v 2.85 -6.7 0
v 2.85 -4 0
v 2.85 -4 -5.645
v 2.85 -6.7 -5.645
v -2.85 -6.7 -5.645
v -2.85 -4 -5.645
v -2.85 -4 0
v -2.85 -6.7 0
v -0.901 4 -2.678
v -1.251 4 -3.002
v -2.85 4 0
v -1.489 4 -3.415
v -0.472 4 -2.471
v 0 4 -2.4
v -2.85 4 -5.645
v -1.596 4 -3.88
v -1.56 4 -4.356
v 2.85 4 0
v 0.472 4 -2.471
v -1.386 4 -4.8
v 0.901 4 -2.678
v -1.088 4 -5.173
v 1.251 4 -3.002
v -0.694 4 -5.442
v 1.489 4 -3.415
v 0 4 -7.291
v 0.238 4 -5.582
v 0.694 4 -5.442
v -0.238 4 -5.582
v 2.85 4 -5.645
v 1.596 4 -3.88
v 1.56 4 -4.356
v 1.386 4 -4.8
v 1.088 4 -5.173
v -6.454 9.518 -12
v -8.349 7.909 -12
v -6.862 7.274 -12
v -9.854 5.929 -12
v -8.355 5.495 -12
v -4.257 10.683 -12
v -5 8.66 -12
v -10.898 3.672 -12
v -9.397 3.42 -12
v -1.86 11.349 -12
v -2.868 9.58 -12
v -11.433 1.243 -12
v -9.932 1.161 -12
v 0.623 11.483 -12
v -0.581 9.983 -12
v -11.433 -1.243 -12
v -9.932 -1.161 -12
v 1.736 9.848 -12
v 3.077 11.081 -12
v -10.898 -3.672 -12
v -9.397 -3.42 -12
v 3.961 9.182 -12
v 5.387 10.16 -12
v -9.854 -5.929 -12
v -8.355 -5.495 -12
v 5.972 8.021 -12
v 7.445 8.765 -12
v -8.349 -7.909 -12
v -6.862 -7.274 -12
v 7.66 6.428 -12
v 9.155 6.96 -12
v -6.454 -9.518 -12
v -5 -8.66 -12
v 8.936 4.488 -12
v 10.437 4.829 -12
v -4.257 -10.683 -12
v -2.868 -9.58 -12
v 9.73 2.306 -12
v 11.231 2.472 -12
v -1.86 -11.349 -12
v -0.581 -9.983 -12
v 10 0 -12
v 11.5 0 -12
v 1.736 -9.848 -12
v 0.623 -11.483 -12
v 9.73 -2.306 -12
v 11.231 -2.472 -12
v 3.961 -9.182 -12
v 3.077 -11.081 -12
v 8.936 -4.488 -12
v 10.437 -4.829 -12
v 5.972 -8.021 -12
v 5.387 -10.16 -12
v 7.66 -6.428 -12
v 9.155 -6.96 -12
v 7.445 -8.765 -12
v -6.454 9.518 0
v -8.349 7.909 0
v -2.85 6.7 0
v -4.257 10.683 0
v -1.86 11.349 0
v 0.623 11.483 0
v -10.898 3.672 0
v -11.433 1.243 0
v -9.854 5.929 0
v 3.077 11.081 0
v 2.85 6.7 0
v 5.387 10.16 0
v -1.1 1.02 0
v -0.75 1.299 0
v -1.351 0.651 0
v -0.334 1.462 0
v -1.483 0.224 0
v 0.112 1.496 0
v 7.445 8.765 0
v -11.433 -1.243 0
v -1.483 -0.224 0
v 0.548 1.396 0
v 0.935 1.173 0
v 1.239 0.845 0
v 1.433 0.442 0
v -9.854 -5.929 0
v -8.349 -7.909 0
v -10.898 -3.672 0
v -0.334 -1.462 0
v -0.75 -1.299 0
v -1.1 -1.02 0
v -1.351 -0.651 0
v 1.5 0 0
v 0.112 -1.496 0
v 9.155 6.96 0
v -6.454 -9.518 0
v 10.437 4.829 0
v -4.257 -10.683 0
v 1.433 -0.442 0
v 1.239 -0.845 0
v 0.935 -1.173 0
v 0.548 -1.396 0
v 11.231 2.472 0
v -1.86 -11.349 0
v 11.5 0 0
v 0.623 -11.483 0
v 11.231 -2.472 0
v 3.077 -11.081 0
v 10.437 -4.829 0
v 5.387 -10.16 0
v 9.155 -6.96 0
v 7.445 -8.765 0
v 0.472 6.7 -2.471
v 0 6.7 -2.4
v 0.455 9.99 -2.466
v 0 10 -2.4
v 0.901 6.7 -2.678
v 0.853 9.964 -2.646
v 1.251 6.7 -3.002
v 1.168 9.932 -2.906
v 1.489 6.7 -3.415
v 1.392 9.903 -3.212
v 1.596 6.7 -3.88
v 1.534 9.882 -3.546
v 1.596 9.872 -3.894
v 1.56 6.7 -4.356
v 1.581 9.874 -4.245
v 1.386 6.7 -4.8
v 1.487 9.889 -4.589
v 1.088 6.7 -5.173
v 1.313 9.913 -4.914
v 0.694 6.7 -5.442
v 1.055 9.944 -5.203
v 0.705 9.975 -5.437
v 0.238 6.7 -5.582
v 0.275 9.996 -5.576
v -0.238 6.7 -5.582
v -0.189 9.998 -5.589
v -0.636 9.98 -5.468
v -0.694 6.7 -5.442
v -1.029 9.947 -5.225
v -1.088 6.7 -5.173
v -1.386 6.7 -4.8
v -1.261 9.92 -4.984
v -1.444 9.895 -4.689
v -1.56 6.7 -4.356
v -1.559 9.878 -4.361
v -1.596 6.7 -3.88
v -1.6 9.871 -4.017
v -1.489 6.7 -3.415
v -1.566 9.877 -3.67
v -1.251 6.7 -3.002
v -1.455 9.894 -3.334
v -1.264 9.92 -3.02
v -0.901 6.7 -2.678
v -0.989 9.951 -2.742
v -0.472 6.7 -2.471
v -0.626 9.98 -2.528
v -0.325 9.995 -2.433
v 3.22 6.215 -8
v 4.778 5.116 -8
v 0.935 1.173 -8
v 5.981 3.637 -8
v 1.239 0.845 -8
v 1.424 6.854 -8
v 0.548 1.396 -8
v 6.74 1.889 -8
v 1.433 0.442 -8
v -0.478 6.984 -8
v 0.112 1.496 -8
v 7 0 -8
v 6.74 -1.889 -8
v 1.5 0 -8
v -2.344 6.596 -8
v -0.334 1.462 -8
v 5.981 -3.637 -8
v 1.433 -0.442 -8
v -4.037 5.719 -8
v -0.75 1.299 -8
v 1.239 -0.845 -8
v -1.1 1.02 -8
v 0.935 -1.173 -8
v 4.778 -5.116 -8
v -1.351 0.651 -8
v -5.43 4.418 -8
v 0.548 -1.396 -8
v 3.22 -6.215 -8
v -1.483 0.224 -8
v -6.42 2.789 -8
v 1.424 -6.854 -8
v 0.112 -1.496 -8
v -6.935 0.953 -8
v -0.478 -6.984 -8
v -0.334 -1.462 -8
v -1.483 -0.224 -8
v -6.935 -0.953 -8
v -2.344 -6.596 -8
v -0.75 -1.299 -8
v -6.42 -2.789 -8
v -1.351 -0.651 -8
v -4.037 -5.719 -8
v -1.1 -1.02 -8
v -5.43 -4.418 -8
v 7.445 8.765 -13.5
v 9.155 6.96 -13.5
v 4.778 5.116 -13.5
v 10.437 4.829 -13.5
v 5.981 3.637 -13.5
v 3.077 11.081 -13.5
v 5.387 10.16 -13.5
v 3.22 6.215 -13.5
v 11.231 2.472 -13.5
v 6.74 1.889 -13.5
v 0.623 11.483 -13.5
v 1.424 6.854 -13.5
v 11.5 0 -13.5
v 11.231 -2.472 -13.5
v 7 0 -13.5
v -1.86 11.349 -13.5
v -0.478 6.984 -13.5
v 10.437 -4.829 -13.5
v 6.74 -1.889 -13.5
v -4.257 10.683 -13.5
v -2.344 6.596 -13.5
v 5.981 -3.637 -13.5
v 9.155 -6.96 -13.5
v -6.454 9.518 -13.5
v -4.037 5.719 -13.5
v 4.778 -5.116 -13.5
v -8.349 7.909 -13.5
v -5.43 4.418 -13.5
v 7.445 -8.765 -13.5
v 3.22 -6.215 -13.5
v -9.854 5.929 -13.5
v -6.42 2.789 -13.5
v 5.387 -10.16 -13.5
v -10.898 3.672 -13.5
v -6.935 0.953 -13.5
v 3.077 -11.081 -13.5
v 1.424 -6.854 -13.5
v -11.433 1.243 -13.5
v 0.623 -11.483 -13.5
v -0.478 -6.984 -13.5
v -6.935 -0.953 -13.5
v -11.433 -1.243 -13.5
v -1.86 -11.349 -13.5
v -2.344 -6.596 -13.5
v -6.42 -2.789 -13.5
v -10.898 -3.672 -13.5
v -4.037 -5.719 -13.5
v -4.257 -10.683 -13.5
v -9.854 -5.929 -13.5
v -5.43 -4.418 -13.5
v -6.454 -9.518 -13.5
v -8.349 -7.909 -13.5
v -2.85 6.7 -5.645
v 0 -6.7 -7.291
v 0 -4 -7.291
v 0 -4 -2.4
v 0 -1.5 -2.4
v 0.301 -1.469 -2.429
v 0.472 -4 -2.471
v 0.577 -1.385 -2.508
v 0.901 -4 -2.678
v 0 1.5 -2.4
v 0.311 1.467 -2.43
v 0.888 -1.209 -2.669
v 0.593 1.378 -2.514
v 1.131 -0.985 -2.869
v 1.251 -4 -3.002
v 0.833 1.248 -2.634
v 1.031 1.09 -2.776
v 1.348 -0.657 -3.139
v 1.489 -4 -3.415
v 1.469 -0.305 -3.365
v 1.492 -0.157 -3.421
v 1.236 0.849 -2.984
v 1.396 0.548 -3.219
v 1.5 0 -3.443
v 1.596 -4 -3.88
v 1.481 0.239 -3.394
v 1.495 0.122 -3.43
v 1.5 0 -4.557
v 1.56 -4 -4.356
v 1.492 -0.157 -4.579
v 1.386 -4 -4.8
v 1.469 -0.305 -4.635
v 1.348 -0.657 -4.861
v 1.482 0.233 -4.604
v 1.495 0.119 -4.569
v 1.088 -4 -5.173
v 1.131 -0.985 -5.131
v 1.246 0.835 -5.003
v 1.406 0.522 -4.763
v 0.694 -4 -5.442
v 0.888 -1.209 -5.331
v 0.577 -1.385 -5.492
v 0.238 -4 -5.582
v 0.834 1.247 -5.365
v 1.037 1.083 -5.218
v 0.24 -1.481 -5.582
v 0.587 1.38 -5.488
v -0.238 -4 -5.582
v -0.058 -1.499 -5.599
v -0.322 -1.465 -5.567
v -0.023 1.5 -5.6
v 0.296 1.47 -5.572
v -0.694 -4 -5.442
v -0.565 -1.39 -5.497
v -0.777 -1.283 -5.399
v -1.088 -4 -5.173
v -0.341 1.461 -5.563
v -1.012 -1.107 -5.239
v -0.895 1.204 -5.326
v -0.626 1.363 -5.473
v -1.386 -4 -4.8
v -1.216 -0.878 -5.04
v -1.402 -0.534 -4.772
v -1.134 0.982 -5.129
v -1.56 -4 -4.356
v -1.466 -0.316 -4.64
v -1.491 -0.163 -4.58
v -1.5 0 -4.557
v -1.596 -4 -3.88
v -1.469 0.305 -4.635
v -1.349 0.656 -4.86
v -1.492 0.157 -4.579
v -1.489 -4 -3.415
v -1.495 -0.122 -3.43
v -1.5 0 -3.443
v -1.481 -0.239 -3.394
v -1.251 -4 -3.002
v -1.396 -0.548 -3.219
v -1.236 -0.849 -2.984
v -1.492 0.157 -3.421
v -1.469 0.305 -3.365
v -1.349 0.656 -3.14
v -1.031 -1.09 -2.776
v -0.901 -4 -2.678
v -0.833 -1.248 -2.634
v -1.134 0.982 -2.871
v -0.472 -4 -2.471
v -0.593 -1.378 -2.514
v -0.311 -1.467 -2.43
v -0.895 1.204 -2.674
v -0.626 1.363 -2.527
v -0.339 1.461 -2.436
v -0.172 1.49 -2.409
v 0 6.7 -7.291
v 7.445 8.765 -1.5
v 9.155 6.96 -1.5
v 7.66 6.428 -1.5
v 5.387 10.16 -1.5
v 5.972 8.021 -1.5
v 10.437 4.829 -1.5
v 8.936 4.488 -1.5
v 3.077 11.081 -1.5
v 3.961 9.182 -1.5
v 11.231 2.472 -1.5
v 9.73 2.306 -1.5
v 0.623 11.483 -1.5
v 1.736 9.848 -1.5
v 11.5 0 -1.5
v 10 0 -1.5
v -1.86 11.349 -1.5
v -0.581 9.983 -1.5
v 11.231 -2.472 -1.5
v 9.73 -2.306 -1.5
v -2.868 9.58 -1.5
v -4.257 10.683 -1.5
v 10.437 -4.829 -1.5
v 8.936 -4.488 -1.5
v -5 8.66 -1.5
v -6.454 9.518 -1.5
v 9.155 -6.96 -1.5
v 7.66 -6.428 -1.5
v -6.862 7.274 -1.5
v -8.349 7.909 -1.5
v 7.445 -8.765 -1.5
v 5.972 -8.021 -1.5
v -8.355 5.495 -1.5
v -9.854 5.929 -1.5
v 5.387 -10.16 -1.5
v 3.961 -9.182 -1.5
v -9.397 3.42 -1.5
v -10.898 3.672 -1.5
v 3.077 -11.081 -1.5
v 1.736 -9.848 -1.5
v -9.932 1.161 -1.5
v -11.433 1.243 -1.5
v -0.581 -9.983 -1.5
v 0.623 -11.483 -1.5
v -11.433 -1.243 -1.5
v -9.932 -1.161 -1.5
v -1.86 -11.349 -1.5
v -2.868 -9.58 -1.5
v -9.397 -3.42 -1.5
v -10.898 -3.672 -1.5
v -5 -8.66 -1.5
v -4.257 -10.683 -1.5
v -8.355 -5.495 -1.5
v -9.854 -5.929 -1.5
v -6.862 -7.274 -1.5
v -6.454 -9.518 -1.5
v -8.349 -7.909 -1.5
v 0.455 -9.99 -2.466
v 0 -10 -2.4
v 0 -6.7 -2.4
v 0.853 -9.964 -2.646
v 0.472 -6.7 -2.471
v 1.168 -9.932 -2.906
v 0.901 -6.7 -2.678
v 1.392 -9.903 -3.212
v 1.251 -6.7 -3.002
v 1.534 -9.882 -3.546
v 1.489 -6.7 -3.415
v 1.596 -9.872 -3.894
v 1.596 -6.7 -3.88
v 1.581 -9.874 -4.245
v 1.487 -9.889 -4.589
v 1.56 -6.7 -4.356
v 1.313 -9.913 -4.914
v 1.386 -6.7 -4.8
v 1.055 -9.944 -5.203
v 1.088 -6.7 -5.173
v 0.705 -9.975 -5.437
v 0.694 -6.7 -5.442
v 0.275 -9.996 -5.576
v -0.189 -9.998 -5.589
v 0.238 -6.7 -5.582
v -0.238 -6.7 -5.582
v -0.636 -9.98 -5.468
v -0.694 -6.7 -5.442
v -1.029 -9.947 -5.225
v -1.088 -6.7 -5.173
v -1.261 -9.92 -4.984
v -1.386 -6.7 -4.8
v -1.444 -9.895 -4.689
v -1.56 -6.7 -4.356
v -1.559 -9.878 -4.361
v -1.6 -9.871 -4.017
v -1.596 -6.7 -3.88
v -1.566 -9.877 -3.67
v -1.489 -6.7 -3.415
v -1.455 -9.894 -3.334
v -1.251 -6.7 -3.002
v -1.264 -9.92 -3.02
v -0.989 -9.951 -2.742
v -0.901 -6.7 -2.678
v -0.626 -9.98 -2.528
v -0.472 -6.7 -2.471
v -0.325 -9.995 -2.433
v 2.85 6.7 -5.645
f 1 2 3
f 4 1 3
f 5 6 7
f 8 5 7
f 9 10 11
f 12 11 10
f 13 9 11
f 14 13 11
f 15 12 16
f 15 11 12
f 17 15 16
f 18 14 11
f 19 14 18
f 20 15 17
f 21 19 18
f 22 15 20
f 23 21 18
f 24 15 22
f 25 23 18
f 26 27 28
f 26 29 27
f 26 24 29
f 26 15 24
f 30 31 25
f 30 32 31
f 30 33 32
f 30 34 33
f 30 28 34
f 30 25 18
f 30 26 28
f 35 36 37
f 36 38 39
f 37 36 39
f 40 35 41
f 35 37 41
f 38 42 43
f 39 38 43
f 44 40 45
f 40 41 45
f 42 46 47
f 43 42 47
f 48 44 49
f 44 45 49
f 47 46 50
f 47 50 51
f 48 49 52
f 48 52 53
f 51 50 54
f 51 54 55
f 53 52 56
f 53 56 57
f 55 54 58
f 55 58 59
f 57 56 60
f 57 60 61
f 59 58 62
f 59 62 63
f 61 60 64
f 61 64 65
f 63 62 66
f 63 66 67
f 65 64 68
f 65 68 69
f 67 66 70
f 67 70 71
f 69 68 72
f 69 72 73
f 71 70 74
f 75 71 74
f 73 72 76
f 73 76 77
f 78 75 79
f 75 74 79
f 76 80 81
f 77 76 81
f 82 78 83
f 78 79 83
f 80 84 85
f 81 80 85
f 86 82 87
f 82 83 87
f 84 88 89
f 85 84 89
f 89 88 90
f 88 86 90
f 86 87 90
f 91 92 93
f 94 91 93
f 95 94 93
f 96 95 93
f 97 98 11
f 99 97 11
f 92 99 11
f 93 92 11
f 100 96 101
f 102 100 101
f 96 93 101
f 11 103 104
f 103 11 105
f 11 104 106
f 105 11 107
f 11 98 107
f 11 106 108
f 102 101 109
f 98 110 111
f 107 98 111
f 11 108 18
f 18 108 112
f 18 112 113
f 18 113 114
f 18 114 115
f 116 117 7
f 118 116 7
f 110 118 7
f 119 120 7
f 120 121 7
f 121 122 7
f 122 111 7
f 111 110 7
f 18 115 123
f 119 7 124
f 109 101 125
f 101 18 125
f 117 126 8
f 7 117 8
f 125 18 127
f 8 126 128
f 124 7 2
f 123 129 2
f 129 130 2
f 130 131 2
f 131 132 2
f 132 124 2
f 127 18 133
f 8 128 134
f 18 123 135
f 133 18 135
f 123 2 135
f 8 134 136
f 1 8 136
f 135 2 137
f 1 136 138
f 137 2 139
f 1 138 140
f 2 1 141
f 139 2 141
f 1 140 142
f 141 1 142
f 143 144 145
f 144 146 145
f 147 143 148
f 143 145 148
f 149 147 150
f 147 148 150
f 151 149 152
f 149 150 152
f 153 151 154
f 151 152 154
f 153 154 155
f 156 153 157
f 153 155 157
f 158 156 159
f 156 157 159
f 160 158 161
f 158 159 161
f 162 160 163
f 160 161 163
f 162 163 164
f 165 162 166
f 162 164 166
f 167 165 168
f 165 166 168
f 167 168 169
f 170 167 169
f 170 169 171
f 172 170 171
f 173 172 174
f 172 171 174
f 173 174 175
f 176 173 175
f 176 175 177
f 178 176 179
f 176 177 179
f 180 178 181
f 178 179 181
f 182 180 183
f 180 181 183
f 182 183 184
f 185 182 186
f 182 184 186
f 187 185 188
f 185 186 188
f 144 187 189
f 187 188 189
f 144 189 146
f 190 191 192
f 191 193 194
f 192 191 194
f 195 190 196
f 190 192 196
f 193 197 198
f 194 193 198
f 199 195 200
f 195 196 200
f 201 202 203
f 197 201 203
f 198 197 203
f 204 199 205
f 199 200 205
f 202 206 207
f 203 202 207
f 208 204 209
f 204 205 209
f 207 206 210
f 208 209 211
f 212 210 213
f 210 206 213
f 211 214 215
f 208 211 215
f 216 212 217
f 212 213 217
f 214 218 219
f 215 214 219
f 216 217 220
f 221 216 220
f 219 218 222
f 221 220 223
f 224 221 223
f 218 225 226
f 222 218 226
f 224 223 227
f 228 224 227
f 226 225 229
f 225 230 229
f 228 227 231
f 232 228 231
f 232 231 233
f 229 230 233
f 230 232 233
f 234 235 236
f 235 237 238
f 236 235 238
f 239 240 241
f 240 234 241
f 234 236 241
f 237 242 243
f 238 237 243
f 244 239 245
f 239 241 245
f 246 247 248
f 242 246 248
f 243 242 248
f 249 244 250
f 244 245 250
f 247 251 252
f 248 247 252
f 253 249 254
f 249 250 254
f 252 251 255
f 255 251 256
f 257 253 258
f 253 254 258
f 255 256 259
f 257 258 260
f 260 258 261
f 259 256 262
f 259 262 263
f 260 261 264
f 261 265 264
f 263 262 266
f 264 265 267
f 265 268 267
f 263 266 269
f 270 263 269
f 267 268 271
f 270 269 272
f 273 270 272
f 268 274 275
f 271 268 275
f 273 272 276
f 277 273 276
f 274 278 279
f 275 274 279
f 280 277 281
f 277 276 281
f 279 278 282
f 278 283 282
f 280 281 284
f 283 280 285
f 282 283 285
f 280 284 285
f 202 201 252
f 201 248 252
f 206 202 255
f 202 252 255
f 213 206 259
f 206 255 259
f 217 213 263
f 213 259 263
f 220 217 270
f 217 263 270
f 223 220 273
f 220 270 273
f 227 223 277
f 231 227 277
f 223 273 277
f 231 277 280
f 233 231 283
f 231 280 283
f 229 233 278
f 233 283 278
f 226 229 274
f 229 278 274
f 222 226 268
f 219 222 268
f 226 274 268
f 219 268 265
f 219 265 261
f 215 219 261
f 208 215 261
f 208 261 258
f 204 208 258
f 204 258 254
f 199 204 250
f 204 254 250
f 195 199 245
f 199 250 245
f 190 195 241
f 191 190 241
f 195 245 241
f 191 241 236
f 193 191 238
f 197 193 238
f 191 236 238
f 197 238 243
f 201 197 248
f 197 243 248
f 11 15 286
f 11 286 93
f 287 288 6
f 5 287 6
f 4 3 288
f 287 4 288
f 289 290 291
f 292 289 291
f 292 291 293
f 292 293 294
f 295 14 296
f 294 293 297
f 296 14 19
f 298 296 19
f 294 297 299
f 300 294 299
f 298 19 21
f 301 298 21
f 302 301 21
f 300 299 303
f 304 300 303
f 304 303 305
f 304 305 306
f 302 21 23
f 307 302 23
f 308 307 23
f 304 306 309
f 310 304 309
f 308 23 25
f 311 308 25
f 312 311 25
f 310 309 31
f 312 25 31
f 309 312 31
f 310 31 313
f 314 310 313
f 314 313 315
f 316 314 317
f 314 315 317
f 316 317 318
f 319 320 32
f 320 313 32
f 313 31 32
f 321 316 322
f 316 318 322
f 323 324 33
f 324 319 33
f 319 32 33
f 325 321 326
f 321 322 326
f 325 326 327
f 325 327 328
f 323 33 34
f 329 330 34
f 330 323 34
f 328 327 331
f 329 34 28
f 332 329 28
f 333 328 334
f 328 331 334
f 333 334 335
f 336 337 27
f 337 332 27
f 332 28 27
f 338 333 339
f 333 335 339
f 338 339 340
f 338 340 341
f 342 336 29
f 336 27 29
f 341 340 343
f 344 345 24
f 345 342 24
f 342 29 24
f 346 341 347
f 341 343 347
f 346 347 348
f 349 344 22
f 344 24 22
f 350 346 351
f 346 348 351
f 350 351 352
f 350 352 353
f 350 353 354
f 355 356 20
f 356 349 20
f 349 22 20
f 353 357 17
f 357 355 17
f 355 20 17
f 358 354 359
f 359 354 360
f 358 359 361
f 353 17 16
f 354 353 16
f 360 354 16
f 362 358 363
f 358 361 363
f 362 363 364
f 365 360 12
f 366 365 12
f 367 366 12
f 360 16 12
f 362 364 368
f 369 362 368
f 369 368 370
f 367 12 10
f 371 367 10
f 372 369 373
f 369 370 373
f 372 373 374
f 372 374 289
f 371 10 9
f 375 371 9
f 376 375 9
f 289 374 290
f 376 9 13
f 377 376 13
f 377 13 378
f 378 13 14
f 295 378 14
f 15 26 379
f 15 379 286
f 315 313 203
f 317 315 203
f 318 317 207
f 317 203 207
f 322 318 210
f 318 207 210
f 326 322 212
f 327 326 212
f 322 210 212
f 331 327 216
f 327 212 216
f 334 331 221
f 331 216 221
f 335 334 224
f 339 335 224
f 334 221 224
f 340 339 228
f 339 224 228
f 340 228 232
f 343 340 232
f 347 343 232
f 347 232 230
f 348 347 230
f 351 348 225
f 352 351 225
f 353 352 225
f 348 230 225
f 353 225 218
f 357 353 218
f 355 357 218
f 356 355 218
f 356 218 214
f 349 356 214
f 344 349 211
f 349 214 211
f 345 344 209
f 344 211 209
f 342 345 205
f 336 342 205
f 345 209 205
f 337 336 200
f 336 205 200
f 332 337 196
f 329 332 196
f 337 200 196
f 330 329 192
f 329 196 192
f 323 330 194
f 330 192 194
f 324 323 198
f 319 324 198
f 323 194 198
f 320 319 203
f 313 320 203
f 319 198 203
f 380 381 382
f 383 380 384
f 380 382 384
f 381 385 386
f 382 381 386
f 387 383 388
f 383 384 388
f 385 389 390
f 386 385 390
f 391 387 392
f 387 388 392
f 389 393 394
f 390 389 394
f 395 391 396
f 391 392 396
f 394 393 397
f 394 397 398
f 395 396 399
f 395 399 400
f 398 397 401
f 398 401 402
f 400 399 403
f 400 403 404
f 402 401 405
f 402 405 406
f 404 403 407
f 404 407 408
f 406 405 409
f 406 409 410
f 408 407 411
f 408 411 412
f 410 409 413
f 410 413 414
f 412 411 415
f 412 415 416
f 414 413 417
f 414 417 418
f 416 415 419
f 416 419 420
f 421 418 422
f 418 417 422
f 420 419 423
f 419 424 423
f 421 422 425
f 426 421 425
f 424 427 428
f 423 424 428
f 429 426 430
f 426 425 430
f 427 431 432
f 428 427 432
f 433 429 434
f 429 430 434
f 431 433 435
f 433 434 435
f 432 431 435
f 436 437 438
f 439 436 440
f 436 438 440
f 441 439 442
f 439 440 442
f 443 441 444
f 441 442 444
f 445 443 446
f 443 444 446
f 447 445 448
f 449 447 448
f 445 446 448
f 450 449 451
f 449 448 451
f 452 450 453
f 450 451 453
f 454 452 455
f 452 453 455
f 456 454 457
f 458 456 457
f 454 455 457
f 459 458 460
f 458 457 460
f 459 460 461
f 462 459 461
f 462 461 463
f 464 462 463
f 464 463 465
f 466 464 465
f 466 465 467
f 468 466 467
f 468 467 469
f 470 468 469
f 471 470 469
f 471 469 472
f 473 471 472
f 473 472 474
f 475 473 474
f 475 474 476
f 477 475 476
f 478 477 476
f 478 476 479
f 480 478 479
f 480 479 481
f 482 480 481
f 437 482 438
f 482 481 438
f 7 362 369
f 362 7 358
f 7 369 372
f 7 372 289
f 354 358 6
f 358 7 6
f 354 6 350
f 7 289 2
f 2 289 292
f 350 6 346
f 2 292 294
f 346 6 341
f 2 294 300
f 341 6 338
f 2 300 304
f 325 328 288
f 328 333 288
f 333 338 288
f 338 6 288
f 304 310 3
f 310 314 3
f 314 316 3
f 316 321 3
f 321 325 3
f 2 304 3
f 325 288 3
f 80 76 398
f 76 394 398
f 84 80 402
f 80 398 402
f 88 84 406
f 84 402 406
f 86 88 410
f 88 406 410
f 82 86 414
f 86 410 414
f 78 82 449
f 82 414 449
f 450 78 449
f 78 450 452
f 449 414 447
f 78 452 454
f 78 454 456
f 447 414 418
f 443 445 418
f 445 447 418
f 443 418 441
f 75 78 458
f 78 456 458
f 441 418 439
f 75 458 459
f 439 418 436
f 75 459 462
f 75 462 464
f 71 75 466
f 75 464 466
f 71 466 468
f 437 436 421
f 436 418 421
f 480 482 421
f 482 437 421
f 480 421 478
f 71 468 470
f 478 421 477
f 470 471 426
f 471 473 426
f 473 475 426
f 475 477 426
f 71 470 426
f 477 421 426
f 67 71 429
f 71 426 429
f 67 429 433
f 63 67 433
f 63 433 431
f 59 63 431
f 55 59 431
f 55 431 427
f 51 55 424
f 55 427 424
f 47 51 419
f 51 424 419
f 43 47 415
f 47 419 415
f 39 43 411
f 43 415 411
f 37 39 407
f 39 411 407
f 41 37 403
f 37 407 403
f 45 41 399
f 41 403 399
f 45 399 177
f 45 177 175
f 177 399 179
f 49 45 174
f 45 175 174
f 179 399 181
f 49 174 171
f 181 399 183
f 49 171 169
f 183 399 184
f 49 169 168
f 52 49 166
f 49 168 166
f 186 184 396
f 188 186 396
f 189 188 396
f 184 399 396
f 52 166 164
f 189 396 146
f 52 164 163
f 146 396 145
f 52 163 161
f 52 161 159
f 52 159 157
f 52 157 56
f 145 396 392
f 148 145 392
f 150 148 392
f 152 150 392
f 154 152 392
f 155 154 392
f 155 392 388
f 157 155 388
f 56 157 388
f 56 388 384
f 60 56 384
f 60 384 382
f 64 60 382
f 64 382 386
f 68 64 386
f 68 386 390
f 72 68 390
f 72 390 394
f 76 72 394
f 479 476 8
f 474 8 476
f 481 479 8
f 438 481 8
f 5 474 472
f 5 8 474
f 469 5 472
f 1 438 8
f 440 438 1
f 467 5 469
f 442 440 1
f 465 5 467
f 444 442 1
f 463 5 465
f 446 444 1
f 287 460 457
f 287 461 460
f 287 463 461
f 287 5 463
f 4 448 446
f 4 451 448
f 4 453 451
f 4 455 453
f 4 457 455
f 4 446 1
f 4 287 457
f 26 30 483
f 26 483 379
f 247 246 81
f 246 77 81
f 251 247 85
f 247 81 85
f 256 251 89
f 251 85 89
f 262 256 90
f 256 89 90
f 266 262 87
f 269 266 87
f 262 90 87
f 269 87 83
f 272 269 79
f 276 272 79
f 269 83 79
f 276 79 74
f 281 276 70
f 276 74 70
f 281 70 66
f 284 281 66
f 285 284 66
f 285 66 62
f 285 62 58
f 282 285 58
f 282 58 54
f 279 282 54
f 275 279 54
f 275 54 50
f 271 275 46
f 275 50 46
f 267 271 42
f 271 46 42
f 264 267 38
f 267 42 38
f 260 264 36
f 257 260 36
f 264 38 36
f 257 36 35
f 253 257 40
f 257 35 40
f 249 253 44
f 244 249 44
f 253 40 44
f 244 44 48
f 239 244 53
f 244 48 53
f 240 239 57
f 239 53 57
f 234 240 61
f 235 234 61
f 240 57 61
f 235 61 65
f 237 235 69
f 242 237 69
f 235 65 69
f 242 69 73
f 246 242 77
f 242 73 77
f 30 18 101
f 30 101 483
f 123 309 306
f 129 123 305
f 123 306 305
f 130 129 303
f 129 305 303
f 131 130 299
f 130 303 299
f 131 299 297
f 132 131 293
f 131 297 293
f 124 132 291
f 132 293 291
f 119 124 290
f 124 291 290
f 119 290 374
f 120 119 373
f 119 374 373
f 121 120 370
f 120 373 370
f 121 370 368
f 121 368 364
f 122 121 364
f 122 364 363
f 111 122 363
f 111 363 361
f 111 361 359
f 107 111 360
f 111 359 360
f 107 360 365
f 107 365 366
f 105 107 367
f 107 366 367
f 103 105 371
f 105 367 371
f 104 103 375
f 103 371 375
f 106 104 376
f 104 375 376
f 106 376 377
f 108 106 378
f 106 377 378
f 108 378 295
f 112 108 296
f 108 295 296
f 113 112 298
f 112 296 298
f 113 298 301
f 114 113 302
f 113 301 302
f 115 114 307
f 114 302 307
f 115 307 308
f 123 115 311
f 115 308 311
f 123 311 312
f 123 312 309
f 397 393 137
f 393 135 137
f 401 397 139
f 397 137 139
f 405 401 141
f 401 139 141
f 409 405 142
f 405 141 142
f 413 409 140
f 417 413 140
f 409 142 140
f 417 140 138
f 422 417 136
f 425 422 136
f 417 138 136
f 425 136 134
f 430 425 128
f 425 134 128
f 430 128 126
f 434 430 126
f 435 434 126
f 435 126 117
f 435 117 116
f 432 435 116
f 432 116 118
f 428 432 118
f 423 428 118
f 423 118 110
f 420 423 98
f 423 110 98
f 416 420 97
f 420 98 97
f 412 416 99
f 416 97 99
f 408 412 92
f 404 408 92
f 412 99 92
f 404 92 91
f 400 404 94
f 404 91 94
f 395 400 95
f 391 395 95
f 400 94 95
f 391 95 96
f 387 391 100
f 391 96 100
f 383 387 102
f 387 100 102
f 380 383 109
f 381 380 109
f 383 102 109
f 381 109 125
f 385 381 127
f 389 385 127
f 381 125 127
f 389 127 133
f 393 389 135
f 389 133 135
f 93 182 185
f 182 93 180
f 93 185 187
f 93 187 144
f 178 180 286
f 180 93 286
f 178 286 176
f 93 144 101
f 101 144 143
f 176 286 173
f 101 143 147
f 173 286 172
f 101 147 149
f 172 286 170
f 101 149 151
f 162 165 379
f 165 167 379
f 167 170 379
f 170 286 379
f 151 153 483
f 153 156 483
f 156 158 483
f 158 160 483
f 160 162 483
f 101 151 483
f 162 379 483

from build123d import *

# Parameters (mm, degrees)
SKETCH_2_R          = 1.6
CUT_EXTRUDE_1_DEPTH = 22.136461388
CUT_EXTRUDE_START   = -4
SKETCH_2_4_R        = 1.6
CUT_EXTRUDE_2_DEPTH = 2.7


with BuildPart() as part:
    # Эскиз1 → Повернуть1 (revolve)
    with BuildSketch(Plane(origin=(0, 0, 0), x_dir=(0, 0, -1), z_dir=(1, 0, 0))):
        Polygon((0, 11.5), (0, 1.5), (8, 1.5), (8, 7), (13.5, 7), (13.5, 11.5), (12, 11.5), (12, 10), (1.5, 10), (1.5, 11.5), align=None)
    revolve(axis=Axis((0, 0, 0), (0, 0, -1)))

    # Эскиз2 → Вырез-Вытянуть1 (cut, through all)
    with BuildSketch(Plane(origin=(0, 0, 0), x_dir=(1, 0, 0), z_dir=(0, 1, 0))):
        with Locations((0, 4)):
            Circle(SKETCH_2_R)
    cut_extrude_1 = extrude(amount=-CUT_EXTRUDE_1_DEPTH, mode=Mode.SUBTRACT)

    # Эскиз2<4> → Вырез-Вытянуть2 (cut)
    with BuildSketch(Plane(origin=(0, 0, 0), x_dir=(1, 0, 0), z_dir=(0, 1, 0)).offset(CUT_EXTRUDE_START)):
        Polygon((0, 7.290896534), (-2.85, 5.645448267), (-2.85, 2.354551733), (-2.85, 0), (2.85, 0), (2.85, 2.354551733), (2.85, 5.645448267), align=None)
        with Locations((0, 4)):
            Circle(SKETCH_2_4_R, mode=Mode.SUBTRACT)
    cut_extrude_2 = extrude(amount=-CUT_EXTRUDE_2_DEPTH, mode=Mode.SUBTRACT)

    # Зеркальное отражение1: Вырез-Вытянуть1, Вырез-Вытянуть2 across plane
    add(cut_extrude_1.mirror(Plane.ZX), mode=Mode.SUBTRACT)
    add(cut_extrude_2.mirror(Plane.ZX), mode=Mode.SUBTRACT)


solid = part.part
